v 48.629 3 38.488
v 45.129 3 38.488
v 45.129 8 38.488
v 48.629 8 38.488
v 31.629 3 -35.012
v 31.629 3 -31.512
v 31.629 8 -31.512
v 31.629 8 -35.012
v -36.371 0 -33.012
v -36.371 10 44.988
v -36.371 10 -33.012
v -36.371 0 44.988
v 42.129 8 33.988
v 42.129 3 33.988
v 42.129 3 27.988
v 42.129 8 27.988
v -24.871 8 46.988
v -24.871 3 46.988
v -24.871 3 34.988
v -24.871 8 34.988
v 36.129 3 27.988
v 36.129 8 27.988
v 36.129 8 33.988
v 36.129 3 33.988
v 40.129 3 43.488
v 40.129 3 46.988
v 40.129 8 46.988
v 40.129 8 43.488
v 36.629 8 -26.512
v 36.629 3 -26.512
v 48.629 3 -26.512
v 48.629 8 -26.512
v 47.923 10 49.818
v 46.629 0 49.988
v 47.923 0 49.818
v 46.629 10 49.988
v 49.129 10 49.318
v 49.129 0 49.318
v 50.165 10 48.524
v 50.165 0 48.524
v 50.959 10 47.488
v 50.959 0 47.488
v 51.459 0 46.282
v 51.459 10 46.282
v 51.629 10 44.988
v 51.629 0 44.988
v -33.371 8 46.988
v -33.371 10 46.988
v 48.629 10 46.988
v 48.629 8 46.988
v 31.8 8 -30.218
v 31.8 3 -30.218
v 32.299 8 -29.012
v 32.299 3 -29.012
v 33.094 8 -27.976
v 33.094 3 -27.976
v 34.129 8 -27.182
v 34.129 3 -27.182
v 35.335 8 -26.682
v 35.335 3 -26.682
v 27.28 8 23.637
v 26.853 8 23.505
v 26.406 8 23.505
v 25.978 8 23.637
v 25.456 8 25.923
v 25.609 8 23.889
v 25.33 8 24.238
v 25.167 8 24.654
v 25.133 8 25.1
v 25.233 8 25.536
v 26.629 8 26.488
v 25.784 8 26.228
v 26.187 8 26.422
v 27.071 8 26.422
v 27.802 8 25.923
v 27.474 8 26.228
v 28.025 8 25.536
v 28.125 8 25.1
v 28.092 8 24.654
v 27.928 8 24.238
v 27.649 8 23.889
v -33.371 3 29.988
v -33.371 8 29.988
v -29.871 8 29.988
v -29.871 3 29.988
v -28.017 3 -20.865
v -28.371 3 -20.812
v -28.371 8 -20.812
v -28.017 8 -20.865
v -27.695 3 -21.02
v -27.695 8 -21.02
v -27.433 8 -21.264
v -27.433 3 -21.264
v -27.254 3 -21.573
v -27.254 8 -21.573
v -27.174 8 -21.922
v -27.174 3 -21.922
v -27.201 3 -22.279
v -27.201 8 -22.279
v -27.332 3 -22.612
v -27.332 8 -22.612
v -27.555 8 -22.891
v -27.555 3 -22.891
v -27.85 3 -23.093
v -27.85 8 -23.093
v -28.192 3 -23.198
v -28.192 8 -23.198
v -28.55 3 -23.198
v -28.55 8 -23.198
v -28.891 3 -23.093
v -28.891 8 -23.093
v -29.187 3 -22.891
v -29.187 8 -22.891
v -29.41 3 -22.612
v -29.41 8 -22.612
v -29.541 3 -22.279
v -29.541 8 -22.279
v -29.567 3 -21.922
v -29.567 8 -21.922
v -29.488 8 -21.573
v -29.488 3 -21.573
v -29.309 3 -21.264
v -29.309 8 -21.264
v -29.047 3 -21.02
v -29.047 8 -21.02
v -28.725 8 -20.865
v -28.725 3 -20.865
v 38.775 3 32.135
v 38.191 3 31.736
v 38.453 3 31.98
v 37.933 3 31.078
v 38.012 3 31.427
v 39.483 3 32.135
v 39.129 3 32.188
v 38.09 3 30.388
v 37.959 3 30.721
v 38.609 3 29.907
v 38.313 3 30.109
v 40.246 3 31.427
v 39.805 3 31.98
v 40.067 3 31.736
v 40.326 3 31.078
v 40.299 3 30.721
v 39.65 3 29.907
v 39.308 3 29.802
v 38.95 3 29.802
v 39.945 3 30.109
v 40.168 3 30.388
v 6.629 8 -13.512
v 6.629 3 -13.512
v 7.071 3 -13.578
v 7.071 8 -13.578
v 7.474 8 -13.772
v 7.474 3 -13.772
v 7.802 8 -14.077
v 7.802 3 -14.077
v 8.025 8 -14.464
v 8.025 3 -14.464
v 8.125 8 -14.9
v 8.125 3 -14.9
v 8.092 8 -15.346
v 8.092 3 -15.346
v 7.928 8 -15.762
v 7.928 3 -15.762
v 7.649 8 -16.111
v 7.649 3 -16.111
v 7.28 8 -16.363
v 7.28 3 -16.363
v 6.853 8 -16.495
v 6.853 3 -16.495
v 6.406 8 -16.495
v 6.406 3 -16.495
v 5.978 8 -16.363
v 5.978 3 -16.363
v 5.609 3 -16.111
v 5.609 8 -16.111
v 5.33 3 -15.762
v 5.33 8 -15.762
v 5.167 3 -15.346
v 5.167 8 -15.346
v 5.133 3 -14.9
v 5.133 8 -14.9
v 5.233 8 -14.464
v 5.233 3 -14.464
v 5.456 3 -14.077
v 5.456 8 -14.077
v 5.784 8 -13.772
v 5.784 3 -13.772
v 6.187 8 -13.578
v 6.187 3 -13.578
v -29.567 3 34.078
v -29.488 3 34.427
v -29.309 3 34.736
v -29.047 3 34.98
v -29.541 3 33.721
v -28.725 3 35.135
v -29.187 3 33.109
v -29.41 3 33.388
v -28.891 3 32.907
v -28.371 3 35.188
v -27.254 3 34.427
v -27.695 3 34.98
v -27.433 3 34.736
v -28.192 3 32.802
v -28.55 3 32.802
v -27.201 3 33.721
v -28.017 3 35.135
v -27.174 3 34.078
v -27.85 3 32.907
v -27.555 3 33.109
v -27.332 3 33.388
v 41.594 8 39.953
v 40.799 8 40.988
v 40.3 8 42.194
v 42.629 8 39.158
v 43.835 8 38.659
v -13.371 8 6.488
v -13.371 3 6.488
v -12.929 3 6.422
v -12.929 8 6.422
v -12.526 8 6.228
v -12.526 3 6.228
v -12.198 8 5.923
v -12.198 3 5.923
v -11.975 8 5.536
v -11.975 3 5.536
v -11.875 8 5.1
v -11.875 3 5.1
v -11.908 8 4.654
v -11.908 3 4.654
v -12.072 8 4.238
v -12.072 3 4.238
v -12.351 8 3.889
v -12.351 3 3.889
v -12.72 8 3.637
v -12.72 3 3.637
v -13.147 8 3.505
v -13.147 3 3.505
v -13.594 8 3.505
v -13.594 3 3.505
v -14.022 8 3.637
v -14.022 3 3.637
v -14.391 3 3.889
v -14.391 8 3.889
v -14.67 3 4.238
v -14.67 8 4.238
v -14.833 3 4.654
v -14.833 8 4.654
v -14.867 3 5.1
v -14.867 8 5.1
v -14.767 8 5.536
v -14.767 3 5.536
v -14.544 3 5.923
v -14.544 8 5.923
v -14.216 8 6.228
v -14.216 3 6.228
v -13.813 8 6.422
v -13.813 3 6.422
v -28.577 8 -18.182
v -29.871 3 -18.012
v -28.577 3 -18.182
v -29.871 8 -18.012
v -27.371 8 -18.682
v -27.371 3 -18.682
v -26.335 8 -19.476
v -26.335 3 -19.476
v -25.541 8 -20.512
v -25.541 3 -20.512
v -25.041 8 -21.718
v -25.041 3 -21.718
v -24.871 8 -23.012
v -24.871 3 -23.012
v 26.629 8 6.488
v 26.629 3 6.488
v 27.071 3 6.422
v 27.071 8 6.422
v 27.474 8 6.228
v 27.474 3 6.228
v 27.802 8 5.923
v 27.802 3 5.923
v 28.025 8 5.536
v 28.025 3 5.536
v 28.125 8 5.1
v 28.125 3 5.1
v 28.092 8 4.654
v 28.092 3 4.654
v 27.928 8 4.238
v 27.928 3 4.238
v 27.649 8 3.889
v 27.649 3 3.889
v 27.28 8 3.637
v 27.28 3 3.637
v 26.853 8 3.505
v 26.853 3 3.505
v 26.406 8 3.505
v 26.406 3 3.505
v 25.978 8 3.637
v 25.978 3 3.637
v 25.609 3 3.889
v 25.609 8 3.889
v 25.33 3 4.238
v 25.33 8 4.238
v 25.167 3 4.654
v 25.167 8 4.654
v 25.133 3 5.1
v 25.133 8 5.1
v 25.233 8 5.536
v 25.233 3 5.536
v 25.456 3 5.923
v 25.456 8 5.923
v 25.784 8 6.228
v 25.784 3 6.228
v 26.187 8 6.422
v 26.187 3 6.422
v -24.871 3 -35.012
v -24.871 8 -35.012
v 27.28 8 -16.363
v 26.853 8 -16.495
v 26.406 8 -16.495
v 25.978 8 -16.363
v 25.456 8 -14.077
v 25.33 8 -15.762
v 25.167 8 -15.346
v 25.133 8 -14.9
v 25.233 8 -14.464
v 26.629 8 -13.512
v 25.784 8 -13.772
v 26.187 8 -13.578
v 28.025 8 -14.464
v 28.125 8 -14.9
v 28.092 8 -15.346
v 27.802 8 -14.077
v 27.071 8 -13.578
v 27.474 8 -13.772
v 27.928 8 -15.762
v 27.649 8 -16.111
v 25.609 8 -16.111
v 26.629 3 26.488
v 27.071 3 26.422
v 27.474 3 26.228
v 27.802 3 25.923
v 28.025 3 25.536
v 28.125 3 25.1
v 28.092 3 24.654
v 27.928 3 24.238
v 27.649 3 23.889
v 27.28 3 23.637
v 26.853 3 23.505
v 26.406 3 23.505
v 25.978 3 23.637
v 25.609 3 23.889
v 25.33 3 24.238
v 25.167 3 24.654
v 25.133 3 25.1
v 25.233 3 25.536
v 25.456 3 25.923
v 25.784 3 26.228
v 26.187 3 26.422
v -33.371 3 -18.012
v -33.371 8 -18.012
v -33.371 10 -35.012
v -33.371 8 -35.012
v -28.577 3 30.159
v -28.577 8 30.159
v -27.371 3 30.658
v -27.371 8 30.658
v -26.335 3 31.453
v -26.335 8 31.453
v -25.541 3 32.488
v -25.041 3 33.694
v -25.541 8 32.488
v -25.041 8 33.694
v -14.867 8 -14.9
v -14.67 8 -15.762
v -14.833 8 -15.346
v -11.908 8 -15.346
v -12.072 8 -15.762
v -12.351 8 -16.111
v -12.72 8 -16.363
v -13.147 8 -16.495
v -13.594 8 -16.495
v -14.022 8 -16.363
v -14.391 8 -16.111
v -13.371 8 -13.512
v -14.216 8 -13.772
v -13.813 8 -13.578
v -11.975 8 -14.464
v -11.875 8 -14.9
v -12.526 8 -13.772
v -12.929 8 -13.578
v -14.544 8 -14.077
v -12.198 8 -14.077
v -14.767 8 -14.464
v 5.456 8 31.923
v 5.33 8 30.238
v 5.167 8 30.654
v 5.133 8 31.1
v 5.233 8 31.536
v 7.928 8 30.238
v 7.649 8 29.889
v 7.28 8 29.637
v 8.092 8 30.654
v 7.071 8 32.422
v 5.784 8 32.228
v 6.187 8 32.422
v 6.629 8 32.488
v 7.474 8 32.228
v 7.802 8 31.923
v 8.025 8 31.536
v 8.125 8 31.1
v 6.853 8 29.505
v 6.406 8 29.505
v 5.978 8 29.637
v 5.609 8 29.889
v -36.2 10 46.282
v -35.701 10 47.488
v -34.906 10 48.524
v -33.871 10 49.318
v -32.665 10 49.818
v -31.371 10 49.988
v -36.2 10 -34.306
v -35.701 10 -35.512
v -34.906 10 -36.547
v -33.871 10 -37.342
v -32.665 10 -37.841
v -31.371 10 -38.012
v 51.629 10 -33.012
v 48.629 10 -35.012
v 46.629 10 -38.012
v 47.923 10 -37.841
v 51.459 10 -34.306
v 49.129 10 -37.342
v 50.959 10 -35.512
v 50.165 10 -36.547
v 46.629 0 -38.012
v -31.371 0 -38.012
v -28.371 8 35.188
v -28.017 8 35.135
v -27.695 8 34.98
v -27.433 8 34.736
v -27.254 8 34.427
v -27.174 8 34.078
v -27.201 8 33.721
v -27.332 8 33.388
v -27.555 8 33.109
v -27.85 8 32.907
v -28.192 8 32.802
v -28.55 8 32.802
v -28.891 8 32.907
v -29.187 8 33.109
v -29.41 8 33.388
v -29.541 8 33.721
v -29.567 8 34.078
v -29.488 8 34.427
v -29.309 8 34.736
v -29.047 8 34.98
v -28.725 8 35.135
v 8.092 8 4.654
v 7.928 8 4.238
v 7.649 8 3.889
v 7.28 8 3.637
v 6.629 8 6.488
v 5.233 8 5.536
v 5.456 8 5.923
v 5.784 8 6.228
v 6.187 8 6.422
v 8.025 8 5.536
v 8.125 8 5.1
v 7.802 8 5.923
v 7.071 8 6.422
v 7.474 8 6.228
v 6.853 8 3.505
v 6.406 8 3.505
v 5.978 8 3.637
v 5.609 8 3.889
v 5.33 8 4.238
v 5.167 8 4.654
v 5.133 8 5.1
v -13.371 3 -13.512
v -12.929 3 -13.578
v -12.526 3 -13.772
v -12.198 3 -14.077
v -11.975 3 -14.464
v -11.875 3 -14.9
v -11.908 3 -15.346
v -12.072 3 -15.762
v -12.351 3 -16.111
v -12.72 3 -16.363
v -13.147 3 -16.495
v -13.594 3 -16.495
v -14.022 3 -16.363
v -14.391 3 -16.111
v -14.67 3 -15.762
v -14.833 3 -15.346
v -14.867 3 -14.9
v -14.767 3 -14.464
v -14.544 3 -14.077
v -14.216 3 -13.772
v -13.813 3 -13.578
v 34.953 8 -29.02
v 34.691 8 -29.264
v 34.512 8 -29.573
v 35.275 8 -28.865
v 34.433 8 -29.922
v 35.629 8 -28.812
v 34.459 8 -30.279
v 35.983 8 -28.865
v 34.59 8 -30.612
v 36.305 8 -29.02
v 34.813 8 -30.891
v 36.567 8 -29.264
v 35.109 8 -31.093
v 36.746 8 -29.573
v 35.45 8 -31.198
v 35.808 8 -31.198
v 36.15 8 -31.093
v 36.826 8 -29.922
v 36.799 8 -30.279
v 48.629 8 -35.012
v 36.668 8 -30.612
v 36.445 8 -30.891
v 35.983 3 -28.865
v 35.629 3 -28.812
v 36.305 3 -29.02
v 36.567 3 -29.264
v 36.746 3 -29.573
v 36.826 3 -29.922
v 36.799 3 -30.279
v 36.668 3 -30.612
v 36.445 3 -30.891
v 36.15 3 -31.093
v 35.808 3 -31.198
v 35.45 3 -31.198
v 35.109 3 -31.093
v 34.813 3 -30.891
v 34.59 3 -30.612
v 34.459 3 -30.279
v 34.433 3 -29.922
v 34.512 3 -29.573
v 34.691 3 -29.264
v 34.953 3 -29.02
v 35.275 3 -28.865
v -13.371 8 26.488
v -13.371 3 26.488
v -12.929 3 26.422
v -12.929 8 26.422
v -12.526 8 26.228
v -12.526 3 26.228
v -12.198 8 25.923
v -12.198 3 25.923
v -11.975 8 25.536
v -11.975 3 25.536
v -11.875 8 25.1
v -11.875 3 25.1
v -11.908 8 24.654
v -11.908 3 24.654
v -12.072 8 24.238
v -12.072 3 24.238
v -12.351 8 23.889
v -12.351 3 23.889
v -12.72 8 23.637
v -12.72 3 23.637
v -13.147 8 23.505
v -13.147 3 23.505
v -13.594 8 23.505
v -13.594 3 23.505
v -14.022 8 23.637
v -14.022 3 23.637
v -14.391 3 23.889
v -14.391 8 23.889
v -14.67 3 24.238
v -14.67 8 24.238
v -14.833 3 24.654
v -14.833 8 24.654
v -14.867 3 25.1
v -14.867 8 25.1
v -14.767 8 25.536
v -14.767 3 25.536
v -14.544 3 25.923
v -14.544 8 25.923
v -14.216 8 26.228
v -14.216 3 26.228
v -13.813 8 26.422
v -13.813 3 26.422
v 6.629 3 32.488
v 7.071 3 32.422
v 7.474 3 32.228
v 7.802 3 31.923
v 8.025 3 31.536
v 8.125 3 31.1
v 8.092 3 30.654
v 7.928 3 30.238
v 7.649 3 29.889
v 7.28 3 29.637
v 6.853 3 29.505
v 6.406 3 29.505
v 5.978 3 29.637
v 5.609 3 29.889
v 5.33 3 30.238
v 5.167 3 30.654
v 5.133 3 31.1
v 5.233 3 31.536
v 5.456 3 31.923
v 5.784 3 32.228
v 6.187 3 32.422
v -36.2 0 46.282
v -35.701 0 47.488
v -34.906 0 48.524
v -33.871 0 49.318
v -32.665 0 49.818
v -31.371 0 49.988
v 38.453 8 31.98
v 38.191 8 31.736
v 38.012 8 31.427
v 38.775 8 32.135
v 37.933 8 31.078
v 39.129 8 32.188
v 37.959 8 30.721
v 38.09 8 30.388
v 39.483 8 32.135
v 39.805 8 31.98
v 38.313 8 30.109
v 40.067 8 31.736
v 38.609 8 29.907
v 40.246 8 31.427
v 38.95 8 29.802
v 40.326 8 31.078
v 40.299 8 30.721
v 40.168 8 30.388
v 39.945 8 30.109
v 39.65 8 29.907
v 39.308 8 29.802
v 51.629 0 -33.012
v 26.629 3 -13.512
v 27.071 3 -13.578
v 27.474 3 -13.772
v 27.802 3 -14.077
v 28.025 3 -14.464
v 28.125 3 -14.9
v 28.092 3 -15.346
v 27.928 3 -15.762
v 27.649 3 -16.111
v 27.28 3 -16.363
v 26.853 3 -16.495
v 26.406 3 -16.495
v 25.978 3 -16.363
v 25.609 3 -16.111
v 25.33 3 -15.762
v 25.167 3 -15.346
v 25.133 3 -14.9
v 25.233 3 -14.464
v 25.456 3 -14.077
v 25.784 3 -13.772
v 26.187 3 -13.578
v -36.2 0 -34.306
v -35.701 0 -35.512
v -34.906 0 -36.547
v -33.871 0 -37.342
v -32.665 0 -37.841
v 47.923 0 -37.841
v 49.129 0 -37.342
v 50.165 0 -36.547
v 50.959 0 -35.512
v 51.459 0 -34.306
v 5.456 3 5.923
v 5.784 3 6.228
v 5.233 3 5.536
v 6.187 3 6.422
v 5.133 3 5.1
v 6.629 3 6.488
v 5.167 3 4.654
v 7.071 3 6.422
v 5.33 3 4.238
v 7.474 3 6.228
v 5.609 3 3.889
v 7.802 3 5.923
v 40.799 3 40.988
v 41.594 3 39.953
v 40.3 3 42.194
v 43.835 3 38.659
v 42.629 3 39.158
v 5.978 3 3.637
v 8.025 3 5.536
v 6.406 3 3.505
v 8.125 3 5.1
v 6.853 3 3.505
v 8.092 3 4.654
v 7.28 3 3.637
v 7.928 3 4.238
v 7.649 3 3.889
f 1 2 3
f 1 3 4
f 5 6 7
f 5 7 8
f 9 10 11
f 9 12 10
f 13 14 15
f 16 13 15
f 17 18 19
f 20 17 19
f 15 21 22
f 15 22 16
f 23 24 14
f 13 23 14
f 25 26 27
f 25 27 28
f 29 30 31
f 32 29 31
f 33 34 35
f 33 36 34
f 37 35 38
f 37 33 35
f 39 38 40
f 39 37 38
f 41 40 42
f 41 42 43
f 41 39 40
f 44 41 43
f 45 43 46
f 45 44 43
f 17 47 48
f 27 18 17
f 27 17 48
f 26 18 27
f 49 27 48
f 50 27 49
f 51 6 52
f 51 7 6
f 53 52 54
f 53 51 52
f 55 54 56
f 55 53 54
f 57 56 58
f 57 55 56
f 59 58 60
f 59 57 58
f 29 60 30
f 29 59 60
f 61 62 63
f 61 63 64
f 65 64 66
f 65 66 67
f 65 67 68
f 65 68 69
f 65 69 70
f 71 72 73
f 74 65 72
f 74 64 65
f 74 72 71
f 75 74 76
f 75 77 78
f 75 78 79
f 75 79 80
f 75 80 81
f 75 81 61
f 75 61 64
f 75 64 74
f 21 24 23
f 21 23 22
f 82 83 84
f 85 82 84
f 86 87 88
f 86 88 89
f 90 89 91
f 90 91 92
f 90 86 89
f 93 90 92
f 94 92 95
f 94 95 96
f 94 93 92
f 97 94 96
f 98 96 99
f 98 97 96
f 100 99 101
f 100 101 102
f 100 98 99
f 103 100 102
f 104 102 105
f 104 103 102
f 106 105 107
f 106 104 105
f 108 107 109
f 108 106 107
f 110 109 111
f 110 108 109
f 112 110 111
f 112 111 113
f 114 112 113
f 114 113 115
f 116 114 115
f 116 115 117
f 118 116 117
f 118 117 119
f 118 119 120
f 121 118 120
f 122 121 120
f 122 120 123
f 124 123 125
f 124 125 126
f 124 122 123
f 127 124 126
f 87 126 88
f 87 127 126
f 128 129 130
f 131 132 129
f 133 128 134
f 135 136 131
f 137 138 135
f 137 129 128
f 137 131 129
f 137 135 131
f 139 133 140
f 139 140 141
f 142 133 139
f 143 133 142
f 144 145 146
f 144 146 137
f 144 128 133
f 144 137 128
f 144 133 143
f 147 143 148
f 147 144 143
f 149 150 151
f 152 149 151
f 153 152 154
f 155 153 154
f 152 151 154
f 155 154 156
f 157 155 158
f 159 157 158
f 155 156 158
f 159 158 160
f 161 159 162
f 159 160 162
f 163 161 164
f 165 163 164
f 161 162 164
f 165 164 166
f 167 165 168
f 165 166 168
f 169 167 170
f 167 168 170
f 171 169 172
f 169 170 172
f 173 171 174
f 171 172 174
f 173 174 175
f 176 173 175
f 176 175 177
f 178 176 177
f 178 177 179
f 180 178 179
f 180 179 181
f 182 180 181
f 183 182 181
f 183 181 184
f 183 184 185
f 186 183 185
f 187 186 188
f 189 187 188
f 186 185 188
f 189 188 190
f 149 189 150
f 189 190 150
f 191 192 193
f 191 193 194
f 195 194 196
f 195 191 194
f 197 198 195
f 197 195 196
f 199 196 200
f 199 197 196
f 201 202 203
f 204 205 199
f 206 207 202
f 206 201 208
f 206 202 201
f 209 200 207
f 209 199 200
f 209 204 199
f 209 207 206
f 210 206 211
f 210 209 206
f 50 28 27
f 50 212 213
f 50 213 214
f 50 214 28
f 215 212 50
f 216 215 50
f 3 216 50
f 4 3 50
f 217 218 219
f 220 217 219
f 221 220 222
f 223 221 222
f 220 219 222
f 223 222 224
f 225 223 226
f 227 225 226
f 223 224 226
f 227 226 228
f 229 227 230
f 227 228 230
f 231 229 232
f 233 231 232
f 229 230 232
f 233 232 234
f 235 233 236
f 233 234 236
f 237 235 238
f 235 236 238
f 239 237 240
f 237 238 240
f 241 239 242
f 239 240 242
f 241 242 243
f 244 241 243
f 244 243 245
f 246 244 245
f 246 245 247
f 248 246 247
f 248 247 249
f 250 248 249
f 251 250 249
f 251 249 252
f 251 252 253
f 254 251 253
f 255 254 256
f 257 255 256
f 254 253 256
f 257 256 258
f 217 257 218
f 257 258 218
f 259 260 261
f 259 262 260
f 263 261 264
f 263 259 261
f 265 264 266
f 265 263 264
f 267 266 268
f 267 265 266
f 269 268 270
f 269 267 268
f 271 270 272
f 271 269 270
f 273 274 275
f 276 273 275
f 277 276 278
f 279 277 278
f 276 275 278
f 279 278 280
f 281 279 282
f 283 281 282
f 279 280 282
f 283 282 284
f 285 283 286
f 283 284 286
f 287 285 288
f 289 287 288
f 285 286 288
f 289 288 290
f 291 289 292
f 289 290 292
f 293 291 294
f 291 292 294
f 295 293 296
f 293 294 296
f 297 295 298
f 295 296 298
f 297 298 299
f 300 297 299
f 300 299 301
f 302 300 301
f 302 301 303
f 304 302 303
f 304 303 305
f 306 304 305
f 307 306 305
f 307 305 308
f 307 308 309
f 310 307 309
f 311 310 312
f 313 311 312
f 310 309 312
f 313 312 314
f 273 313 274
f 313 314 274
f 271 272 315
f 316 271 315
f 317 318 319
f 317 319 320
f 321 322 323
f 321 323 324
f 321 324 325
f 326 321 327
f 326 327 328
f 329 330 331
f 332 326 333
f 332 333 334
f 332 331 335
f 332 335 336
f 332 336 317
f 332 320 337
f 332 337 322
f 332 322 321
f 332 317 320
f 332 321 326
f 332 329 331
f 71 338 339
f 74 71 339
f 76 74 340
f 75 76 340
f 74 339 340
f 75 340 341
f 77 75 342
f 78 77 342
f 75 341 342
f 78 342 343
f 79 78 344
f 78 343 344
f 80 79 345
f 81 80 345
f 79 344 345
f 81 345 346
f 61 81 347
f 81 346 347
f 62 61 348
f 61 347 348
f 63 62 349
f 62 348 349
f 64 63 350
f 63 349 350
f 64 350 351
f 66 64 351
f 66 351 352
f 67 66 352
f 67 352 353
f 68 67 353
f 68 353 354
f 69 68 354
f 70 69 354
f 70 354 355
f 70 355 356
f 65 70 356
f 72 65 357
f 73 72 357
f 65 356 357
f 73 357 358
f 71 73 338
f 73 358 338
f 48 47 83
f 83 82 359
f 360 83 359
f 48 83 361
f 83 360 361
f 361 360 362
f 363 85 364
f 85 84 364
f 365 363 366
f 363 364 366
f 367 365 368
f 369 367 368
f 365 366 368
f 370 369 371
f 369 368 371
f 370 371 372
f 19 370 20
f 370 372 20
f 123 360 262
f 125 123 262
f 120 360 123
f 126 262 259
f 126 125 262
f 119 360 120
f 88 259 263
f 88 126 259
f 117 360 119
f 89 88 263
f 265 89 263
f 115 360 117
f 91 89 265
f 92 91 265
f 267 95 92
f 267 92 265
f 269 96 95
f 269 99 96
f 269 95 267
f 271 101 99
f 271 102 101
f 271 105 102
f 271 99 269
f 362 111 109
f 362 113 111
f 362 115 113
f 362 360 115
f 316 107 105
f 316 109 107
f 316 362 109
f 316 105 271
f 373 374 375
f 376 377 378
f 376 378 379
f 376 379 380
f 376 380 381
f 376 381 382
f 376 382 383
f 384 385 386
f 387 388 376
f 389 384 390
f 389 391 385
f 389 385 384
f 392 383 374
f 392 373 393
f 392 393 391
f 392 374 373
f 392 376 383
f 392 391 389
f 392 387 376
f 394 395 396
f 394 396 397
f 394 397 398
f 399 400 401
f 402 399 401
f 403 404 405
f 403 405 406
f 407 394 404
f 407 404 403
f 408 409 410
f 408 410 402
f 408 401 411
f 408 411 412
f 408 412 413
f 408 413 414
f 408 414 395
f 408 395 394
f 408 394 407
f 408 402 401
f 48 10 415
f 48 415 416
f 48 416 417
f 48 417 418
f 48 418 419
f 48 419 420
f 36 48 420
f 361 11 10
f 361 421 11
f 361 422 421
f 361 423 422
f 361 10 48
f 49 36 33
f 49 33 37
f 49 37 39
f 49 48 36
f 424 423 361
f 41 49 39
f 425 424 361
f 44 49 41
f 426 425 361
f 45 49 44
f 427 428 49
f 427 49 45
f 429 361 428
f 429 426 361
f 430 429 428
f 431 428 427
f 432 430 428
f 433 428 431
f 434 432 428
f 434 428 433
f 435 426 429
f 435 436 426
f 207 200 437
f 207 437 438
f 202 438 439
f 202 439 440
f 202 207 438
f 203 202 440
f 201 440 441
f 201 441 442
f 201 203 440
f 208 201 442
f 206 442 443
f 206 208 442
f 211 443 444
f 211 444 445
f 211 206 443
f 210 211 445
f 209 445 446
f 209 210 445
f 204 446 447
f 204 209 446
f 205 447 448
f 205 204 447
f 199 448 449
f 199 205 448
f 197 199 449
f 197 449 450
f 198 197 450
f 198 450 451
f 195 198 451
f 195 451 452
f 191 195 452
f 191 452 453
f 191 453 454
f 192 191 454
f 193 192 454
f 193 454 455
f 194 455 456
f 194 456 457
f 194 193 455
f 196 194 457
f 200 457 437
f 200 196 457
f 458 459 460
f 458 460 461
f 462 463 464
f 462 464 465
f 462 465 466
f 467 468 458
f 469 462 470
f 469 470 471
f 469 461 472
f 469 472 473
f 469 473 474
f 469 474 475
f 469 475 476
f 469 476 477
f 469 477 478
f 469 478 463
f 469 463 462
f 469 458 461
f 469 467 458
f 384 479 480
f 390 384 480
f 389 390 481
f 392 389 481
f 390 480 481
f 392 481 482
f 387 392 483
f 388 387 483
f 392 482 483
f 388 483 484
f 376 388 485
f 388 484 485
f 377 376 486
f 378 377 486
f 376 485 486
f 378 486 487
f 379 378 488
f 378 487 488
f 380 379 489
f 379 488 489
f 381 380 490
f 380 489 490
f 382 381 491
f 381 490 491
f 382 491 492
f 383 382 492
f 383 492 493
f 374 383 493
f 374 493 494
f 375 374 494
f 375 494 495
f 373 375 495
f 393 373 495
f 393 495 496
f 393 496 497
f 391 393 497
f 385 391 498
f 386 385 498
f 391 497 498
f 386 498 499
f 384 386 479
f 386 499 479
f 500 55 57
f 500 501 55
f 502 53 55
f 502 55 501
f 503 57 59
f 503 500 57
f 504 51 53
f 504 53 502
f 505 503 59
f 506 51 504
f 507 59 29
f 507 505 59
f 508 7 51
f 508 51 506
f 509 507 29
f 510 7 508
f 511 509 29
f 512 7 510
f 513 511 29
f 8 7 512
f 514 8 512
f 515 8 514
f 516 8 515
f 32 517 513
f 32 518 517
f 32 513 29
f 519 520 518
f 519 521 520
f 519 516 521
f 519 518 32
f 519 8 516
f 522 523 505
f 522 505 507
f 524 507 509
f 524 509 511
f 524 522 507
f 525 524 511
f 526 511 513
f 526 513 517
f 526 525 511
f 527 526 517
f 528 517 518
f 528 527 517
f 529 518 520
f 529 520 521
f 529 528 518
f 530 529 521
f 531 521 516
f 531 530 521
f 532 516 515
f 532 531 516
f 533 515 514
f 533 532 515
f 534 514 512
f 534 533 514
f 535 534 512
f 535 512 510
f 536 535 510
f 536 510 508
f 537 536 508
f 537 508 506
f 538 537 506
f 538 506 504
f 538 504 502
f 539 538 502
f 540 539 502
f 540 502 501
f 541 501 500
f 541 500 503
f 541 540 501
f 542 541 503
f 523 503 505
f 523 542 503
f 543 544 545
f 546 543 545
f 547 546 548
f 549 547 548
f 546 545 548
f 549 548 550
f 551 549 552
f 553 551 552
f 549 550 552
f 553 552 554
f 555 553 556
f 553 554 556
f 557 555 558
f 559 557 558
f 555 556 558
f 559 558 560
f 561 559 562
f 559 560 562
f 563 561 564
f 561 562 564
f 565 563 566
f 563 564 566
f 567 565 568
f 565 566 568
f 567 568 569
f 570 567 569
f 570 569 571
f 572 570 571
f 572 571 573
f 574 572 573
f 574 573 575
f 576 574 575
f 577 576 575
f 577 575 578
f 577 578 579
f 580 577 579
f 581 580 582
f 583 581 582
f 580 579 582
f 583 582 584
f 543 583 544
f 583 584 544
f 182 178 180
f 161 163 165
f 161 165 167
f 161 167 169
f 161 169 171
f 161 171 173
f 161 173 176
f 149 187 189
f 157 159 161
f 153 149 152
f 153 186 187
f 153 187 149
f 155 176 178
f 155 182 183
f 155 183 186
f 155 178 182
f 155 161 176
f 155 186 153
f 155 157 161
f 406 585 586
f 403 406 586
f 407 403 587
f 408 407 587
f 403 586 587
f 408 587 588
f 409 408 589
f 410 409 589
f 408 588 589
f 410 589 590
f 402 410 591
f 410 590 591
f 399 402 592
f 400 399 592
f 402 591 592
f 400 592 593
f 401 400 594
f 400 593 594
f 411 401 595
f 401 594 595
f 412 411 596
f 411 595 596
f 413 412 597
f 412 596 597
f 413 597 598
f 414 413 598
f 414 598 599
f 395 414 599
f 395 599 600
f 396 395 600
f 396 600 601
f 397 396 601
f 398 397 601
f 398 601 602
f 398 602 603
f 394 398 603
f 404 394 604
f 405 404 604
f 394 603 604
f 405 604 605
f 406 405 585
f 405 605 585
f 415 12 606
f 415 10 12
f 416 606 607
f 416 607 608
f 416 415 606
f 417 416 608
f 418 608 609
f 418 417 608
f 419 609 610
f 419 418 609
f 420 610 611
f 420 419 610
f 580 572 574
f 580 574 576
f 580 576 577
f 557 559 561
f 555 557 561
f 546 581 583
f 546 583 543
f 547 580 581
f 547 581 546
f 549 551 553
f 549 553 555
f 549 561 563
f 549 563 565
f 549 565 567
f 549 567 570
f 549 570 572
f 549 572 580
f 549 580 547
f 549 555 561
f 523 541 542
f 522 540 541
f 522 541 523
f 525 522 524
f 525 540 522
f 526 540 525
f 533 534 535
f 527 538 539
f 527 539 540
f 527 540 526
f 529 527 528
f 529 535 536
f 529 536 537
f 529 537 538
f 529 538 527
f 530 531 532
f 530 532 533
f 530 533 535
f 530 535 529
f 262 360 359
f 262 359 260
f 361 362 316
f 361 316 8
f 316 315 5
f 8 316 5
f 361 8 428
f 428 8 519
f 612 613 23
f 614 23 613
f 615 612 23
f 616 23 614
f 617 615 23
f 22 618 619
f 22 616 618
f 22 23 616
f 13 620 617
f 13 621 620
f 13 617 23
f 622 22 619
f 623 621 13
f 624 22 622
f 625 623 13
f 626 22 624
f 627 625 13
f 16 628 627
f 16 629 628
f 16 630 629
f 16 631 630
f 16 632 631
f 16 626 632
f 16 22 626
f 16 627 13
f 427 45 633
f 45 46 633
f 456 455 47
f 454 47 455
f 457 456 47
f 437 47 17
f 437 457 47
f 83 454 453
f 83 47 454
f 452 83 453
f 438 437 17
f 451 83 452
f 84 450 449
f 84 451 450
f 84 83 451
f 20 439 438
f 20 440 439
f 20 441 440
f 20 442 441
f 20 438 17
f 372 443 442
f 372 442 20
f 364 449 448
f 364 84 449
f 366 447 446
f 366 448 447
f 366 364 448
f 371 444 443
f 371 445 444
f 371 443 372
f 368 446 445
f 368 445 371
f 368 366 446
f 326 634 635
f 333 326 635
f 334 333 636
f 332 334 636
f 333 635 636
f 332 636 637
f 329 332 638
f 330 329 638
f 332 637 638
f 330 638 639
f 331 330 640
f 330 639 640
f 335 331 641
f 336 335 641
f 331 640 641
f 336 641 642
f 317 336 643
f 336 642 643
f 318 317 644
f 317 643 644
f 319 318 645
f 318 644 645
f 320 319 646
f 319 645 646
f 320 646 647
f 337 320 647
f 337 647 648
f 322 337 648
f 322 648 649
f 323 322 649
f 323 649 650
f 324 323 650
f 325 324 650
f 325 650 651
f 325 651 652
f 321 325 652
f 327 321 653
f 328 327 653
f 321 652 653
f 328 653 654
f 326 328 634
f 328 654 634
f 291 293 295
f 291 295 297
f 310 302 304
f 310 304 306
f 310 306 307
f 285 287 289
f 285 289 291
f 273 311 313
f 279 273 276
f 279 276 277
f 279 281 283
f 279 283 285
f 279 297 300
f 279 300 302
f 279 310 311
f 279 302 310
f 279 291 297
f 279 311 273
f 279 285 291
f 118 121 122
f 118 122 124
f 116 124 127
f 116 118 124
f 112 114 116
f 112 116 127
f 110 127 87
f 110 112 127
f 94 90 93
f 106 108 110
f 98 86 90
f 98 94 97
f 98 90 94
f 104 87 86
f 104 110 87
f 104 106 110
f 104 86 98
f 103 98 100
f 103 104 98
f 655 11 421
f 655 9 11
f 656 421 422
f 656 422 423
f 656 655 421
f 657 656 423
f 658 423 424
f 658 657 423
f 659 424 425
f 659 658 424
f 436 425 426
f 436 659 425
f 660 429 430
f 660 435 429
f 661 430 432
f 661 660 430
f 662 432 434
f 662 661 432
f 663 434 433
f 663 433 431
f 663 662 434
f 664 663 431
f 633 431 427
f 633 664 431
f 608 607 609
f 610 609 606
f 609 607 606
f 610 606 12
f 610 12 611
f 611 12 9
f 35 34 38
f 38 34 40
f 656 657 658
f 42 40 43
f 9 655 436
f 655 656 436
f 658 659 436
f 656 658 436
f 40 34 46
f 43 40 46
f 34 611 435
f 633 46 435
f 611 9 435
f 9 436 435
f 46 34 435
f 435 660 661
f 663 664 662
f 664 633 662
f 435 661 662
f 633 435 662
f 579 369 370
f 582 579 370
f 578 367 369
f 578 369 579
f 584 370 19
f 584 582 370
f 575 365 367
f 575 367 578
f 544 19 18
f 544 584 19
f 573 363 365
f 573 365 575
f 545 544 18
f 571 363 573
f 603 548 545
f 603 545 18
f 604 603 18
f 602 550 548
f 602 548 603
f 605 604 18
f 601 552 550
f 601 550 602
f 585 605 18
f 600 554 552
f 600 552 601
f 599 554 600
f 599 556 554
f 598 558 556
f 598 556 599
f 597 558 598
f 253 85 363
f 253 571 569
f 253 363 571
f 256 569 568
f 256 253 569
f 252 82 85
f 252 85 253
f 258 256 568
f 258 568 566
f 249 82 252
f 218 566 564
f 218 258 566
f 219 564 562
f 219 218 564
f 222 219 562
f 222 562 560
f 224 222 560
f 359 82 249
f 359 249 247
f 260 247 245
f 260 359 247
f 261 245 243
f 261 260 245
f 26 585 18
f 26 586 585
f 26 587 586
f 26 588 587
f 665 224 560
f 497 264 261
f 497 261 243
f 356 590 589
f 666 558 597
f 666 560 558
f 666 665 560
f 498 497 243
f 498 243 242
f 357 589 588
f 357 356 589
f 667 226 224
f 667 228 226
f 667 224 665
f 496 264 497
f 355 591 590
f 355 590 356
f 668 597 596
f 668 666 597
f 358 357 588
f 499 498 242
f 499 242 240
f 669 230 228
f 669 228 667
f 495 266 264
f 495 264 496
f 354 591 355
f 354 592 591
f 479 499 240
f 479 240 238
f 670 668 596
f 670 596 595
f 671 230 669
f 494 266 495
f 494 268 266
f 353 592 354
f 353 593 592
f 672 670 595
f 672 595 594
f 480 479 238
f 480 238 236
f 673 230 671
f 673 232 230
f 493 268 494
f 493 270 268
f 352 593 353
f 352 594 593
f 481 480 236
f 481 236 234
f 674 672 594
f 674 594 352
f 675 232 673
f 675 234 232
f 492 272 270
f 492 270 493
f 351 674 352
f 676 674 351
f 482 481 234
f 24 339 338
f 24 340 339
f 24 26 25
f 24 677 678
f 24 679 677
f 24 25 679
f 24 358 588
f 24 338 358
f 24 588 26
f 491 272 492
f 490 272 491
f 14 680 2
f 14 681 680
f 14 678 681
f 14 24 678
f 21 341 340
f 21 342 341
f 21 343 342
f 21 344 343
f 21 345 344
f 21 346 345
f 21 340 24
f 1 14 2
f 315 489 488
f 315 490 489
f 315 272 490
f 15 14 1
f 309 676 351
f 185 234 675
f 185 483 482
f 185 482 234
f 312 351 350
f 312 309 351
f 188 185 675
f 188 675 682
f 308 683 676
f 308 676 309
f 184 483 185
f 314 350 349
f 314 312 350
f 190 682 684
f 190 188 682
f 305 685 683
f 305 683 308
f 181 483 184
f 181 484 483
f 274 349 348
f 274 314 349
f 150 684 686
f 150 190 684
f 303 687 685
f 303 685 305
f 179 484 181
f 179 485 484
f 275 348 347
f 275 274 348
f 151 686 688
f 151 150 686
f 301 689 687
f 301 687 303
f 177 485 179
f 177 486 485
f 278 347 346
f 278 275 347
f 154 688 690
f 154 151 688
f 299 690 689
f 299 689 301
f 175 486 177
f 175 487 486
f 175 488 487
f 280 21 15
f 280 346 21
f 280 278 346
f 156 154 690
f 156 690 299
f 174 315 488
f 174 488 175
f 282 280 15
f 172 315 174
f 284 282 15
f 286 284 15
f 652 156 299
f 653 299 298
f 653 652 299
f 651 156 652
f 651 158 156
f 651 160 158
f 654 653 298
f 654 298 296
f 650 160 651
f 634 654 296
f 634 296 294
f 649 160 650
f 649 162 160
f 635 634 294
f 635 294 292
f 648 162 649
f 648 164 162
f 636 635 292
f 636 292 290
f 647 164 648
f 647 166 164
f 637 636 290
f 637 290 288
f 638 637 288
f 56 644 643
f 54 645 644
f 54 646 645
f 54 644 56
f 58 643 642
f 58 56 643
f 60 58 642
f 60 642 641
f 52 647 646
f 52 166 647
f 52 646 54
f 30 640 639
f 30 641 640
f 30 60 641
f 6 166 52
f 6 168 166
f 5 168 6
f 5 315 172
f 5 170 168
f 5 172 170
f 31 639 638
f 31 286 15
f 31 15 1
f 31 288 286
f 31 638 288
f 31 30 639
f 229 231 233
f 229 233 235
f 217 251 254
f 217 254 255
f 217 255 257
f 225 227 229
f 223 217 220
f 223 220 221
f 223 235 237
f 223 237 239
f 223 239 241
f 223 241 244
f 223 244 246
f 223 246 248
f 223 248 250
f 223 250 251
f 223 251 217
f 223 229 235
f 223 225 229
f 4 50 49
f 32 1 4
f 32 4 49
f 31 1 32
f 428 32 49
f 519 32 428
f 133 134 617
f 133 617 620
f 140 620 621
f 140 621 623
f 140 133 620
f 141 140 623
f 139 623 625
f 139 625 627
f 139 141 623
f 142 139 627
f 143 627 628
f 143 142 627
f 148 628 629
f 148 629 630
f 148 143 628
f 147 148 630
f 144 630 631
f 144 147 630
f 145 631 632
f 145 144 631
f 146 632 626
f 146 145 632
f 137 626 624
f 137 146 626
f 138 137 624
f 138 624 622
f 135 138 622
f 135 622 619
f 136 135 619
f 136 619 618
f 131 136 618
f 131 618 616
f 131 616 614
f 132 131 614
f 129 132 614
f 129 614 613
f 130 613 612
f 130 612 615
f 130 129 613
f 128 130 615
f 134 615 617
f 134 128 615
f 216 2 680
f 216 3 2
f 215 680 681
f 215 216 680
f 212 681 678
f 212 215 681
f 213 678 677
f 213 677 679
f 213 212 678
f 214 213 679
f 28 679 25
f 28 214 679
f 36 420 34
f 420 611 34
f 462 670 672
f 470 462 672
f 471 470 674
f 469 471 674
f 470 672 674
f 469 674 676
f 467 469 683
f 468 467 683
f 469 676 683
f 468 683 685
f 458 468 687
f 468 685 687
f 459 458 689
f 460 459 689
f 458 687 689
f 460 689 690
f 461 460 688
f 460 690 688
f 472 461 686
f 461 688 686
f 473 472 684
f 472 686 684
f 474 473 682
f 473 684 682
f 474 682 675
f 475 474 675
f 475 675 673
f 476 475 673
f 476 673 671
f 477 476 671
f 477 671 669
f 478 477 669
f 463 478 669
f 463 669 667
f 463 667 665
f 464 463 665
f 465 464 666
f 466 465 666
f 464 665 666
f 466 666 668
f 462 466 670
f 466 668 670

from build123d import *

# Parameters (mm, degrees)
SKETCH_1_W      = 88
SKETCH_1_H      = 88
EXTRUDE_1_DEPTH = 3
SKETCH_2_W      = 88
SKETCH_2_H      = 88
SKETCH_2_W_2    = 82
SKETCH_2_H_2    = 82
EXTRUDE_2_DEPTH = 7
SKETCH_3_R      = 1.5
SKETCH_3_W      = 8.5
SKETCH_3_H      = 17
SKETCH_3_R_2    = 1.2
SKETCH_3_W_2    = 17
SKETCH_3_H_2    = 8.5
SKETCH_3_W_3    = 6
SKETCH_3_H_3    = 6
EXTRUDE_3_DEPTH = 5
FILLET_1_R      = 5


with BuildPart() as part:
    # 草圖1 → 填料-伸長1 (new body)
    with BuildSketch(Plane(origin=(0, 0, 0), x_dir=(1, 0, 0), z_dir=(0, 1, 0))):
        with Locations((7.62917335, -5.98816568)):
            Rectangle(SKETCH_1_W, SKETCH_1_H)
    extrude(amount=EXTRUDE_1_DEPTH)

    # 草圖2 → 填料-伸長2 (add)
    with BuildSketch(Plane(origin=(0, 3, 0), x_dir=(1, 0, 0), z_dir=(0, 1, 0))):
        with Locations((7.62917335, -5.98816568)):
            Rectangle(SKETCH_2_W, SKETCH_2_H)
        with Locations((7.62917335, -5.98816568)):
            Rectangle(SKETCH_2_W_2, SKETCH_2_H_2, mode=Mode.SUBTRACT)
    extrude(amount=EXTRUDE_2_DEPTH)

    # 草圖3 → 填料-伸長3 (add)
    # profile 1 of 14: a face of its own
    with BuildSketch(Plane(origin=(0, 3, 0), x_dir=(1, 0, 0), z_dir=(0, 1, 0))):
        with Locations(Location((-13.37082665, 15.01183432, 0), (0, 0, 270))):
            Circle(SKETCH_3_R)
    # profile 2 of 14: a face of its own
    with BuildSketch(Plane(origin=(0, 3, 0), x_dir=(1, 0, 0), z_dir=(0, 1, 0))):
        with Locations(Location((6.62917335, 15.01183432, 0), (0, 0, 270))):
            Circle(SKETCH_3_R)
    # profile 3 of 14: a face of its own
    with BuildSketch(Plane(origin=(0, 3, 0), x_dir=(1, 0, 0), z_dir=(0, 1, 0))):
        with Locations(Location((26.62917335, 15.01183432, 0), (0, 0, 270))):
            Circle(SKETCH_3_R)
    # profile 4 of 14: a face of its own
    with BuildSketch(Plane(origin=(0, 3, 0), x_dir=(1, 0, 0), z_dir=(0, 1, 0))):
        with Locations(Location((6.62917335, -4.98816568, 0), (0, 0, 270))):
            Circle(SKETCH_3_R)
    # profile 5 of 14: a face of its own
    with BuildSketch(Plane(origin=(0, 3, 0), x_dir=(1, 0, 0), z_dir=(0, 1, 0))):
        with Locations(Location((26.62917335, -4.98816568, 0), (0, 0, 270))):
            Circle(SKETCH_3_R)
    # profile 6 of 14: a face of its own
    with BuildSketch(Plane(origin=(0, 3, 0), x_dir=(1, 0, 0), z_dir=(0, 1, 0))):
        with Locations(Location((26.62917335, -24.98816568, 0), (0, 0, 270))):
            Circle(SKETCH_3_R)
    # profile 7 of 14: a face of its own
    with BuildSketch(Plane(origin=(0, 3, 0), x_dir=(1, 0, 0), z_dir=(0, 1, 0))):
        with Locations(Location((-13.37082665, -4.98816568, 0), (0, 0, 270))):
            Circle(SKETCH_3_R)
    # profile 8 of 14: a face of its own
    with BuildSketch(Plane(origin=(0, 3, 0), x_dir=(1, 0, 0), z_dir=(0, 1, 0))):
        with Locations(Location((-13.37082665, -24.98816568, 0), (0, 0, 270))):
            Circle(SKETCH_3_R)
    # profile 9 of 14: a face of its own
    with BuildSketch(Plane(origin=(0, 3, 0), x_dir=(1, 0, 0), z_dir=(0, 1, 0))):
        with Locations(Location((6.62917335, -30.98816568, 0), (0, 0, 270))):
            Circle(SKETCH_3_R)
    # profile 10 of 14: a face of its own
    with BuildSketch(Plane(origin=(0, 3, 0), x_dir=(1, 0, 0), z_dir=(0, 1, 0))):
        with Locations((-29.12082665, 26.51183432)):
            Rectangle(SKETCH_3_W, SKETCH_3_H)
        with Locations(Location((-28.37082665, 22.01183432, 0), (0, 0, 270))):
            Circle(SKETCH_3_R_2, mode=Mode.SUBTRACT)
    # profile 11 of 14: a face of its own
    with BuildSketch(Plane(origin=(0, 3, 0), x_dir=(1, 0, 0), z_dir=(0, 1, 0))):
        with Locations((-29.12082665, -38.48816568)):
            Rectangle(SKETCH_3_W, SKETCH_3_H)
        with Locations(Location((-28.37082665, -33.98816568, 0), (0, 0, 270))):
            Circle(SKETCH_3_R_2, mode=Mode.SUBTRACT)
    # profile 12 of 14: a face of its own
    with BuildSketch(Plane(origin=(0, 3, 0), x_dir=(1, 0, 0), z_dir=(0, 1, 0))):
        with Locations((40.12917335, 30.76183432)):
            Rectangle(SKETCH_3_W_2, SKETCH_3_H_2)
        with Locations(Location((35.62917335, 30.01183432, 0), (0, 0, 270))):
            Circle(SKETCH_3_R_2, mode=Mode.SUBTRACT)
    # profile 13 of 14: a face of its own
    with BuildSketch(Plane(origin=(0, 3, 0), x_dir=(1, 0, 0), z_dir=(0, 1, 0))):
        with Locations((44.37917335, -42.73816568)):
            Rectangle(SKETCH_3_W, SKETCH_3_H_2)
    # profile 14 of 14: a face of its own
    with BuildSketch(Plane(origin=(0, 3, 0), x_dir=(1, 0, 0), z_dir=(0, 1, 0))):
        with Locations((39.12917335, -30.98816568)):
            Rectangle(SKETCH_3_W_3, SKETCH_3_H_3)
        with Locations(Location((39.12917335, -30.98816568, 0), (0, 0, 270))):
            Circle(SKETCH_3_R_2, mode=Mode.SUBTRACT)
    extrude(amount=EXTRUDE_3_DEPTH)

    # 圓角1
    fillet_1_edges = [part.edges().sort_by_distance(p)[0] for p in [
        (-24.87082665, 5.5, -18.01183432),
        (-24.87082665, 5.5, 29.98816568),
        (31.62917335, 5.5, -26.51183432),
        (-36.37082665, 5, -38.01183432),
        (51.62917335, 5, -38.01183432),
        (51.62917335, 5, 49.98816568),
        (-36.37082665, 5, 49.98816568),
        (40.12917335, 5.5, 38.48816568),
    ]]
    fillet(fillet_1_edges, radius=FILLET_1_R)


solid = part.part
